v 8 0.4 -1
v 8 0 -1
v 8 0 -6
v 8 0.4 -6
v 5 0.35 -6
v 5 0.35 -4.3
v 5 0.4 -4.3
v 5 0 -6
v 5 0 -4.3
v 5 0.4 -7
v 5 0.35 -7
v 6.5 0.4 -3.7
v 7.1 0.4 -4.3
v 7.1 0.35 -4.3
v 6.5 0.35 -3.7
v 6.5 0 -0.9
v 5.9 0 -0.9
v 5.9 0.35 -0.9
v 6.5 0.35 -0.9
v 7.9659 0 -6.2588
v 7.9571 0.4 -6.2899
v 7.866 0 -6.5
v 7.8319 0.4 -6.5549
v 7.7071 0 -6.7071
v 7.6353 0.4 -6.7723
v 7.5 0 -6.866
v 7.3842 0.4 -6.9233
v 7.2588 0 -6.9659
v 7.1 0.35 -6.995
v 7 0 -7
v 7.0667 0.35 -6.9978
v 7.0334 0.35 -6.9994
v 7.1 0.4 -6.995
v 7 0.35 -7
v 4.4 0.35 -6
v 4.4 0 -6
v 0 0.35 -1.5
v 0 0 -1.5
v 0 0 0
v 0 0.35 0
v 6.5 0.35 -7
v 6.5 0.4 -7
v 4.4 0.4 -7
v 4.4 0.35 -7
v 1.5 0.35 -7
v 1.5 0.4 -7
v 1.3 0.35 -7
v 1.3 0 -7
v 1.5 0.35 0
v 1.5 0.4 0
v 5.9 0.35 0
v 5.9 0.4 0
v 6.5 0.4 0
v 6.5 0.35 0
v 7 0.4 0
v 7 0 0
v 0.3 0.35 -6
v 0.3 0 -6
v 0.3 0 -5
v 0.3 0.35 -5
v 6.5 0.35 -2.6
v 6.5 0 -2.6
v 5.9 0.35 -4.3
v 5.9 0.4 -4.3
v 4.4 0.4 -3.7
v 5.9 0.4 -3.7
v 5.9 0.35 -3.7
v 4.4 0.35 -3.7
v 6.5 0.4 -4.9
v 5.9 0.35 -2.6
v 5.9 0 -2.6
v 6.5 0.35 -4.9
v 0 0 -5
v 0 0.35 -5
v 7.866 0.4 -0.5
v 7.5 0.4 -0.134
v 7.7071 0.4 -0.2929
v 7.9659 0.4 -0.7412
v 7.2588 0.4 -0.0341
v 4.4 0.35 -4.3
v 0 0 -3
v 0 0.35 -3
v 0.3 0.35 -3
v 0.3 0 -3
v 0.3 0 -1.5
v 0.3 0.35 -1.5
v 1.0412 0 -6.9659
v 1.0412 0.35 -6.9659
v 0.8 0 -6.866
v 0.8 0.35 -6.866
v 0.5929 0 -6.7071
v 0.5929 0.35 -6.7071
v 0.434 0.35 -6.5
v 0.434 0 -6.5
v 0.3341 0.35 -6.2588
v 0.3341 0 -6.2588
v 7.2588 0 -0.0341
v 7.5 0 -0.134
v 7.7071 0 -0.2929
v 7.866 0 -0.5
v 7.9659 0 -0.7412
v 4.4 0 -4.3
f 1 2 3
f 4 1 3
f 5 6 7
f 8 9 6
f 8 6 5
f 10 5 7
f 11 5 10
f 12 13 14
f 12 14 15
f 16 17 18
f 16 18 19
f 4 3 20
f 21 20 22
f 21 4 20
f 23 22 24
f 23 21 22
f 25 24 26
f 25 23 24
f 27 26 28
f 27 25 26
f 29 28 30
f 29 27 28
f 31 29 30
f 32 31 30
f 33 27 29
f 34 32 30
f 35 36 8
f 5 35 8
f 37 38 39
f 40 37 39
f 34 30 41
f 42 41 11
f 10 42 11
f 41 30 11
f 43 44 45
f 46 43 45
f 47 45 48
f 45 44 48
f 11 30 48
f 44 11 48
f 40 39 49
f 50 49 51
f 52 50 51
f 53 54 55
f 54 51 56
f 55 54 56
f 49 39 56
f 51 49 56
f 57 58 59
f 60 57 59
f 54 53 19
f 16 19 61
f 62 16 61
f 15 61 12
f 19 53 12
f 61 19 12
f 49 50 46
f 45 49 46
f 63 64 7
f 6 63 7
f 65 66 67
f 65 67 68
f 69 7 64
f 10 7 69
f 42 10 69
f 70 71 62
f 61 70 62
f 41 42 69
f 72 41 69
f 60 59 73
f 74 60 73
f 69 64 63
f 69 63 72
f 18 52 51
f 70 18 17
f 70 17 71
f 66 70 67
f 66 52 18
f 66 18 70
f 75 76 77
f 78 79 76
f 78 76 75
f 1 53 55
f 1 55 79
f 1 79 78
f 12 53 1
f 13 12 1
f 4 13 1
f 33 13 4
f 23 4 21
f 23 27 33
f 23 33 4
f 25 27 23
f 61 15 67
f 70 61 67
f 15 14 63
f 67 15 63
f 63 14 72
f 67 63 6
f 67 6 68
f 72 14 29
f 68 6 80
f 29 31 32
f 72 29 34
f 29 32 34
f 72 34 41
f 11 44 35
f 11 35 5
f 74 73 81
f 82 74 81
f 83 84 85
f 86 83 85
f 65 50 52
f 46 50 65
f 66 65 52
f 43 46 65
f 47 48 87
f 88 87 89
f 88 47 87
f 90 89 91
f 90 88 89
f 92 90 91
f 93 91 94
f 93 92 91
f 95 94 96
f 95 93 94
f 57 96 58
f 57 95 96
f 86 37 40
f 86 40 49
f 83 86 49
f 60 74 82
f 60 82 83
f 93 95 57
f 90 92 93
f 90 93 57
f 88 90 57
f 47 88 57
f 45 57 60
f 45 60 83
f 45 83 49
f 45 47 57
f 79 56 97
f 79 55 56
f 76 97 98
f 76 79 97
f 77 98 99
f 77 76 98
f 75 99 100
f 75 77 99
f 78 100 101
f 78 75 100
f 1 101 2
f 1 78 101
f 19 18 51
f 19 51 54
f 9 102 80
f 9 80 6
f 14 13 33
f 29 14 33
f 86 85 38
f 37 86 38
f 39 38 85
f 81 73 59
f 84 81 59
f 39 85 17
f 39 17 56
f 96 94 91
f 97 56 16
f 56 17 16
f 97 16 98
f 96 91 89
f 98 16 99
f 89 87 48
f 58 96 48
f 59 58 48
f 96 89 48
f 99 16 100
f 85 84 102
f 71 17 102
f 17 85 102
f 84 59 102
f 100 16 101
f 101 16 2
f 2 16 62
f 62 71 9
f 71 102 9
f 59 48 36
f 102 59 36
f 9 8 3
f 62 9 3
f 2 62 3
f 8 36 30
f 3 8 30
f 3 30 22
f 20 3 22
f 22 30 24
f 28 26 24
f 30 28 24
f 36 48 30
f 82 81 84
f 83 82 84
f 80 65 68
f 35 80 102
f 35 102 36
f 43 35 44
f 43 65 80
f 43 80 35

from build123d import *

# Parameters (mm, degrees)
SKETCH1_W           = 0.6
SKETCH1_H           = 1.7
BOSS_EXTRUDE1_DEPTH = 0.4
FILLET1_R           = 1
SKETCH3_W           = 0.6
SKETCH3_H           = 0.9
SKETCH3_H_2         = 1
CUT_EXTRUDE2_DEPTH  = 0.05


with BuildPart() as part:
    # Sketch1 → Boss-Extrude1 (new body)
    with BuildSketch(Plane(origin=(0, 0, 0), x_dir=(1, 0, 0), z_dir=(0, 1, 0))):
        Polygon((0, 0), (8, 0), (8, 7), (0.3, 7), (0.3, 5), (0, 5), (0, 3), (0.3, 3), (0.3, 1.5), (0, 1.5), align=None)
        with Locations((4.7, 5.15)):
            Rectangle(SKETCH1_W, SKETCH1_H, mode=Mode.SUBTRACT)
        with Locations((6.2, 1.75)):
            Rectangle(SKETCH1_W, SKETCH1_H, mode=Mode.SUBTRACT)
    extrude(amount=BOSS_EXTRUDE1_DEPTH)

    # Fillet1
    fillet1_edges = [part.edges().sort_by_distance(p)[0] for p in [
        (0.3, 0.2, -7),
        (8, 0.2, -7),
        (8, 0.2, 0),
    ]]
    fillet(fillet1_edges, radius=FILLET1_R)

    # Sketch3 → Cut-Extrude2 (cut)
    with BuildSketch(Plane(origin=(0, 0.4, 0), x_dir=(1, 0, 0), z_dir=(0, 1, 0))):
        with BuildLine():
            Line((1.5, 0), (1.5, 7))
            Line((1.5, 7), (1.3, 7))
            ThreePointArc((1.3, 7), (0.592893219, 6.707106781), (0.3, 6))
            Line((0.3, 6), (0.3, 5))
            Line((0.3, 5), (0, 5))
            Line((0, 5), (0, 3))
            Line((0, 3), (0.3, 3))
            Line((0.3, 3), (0.3, 1.5))
            Line((0.3, 1.5), (0, 1.5))
            Line((0, 1.5), (0, 0))
            Line((0, 0), (1.5, 0))
        make_face()
        with Locations((6.2, 0.45)):
            Rectangle(SKETCH3_W, SKETCH3_H)
        Polygon((4.4, 4.3), (5, 4.3), (5.9, 4.3), (6.5, 4.9), (6.5, 7), (6.5, 7.268876882), (7.1, 7.268876882), (7.1, 6.994987437), (7.1, 4.3), (6.5, 3.7), (6.5, 2.6), (5.9, 2.6), (5.9, 3.7), (4.4, 3.7), align=None)
        with Locations((4.7, 6.5)):
            Rectangle(SKETCH3_W, SKETCH3_H_2)
    extrude(amount=-CUT_EXTRUDE2_DEPTH, mode=Mode.SUBTRACT)


solid = part.part
